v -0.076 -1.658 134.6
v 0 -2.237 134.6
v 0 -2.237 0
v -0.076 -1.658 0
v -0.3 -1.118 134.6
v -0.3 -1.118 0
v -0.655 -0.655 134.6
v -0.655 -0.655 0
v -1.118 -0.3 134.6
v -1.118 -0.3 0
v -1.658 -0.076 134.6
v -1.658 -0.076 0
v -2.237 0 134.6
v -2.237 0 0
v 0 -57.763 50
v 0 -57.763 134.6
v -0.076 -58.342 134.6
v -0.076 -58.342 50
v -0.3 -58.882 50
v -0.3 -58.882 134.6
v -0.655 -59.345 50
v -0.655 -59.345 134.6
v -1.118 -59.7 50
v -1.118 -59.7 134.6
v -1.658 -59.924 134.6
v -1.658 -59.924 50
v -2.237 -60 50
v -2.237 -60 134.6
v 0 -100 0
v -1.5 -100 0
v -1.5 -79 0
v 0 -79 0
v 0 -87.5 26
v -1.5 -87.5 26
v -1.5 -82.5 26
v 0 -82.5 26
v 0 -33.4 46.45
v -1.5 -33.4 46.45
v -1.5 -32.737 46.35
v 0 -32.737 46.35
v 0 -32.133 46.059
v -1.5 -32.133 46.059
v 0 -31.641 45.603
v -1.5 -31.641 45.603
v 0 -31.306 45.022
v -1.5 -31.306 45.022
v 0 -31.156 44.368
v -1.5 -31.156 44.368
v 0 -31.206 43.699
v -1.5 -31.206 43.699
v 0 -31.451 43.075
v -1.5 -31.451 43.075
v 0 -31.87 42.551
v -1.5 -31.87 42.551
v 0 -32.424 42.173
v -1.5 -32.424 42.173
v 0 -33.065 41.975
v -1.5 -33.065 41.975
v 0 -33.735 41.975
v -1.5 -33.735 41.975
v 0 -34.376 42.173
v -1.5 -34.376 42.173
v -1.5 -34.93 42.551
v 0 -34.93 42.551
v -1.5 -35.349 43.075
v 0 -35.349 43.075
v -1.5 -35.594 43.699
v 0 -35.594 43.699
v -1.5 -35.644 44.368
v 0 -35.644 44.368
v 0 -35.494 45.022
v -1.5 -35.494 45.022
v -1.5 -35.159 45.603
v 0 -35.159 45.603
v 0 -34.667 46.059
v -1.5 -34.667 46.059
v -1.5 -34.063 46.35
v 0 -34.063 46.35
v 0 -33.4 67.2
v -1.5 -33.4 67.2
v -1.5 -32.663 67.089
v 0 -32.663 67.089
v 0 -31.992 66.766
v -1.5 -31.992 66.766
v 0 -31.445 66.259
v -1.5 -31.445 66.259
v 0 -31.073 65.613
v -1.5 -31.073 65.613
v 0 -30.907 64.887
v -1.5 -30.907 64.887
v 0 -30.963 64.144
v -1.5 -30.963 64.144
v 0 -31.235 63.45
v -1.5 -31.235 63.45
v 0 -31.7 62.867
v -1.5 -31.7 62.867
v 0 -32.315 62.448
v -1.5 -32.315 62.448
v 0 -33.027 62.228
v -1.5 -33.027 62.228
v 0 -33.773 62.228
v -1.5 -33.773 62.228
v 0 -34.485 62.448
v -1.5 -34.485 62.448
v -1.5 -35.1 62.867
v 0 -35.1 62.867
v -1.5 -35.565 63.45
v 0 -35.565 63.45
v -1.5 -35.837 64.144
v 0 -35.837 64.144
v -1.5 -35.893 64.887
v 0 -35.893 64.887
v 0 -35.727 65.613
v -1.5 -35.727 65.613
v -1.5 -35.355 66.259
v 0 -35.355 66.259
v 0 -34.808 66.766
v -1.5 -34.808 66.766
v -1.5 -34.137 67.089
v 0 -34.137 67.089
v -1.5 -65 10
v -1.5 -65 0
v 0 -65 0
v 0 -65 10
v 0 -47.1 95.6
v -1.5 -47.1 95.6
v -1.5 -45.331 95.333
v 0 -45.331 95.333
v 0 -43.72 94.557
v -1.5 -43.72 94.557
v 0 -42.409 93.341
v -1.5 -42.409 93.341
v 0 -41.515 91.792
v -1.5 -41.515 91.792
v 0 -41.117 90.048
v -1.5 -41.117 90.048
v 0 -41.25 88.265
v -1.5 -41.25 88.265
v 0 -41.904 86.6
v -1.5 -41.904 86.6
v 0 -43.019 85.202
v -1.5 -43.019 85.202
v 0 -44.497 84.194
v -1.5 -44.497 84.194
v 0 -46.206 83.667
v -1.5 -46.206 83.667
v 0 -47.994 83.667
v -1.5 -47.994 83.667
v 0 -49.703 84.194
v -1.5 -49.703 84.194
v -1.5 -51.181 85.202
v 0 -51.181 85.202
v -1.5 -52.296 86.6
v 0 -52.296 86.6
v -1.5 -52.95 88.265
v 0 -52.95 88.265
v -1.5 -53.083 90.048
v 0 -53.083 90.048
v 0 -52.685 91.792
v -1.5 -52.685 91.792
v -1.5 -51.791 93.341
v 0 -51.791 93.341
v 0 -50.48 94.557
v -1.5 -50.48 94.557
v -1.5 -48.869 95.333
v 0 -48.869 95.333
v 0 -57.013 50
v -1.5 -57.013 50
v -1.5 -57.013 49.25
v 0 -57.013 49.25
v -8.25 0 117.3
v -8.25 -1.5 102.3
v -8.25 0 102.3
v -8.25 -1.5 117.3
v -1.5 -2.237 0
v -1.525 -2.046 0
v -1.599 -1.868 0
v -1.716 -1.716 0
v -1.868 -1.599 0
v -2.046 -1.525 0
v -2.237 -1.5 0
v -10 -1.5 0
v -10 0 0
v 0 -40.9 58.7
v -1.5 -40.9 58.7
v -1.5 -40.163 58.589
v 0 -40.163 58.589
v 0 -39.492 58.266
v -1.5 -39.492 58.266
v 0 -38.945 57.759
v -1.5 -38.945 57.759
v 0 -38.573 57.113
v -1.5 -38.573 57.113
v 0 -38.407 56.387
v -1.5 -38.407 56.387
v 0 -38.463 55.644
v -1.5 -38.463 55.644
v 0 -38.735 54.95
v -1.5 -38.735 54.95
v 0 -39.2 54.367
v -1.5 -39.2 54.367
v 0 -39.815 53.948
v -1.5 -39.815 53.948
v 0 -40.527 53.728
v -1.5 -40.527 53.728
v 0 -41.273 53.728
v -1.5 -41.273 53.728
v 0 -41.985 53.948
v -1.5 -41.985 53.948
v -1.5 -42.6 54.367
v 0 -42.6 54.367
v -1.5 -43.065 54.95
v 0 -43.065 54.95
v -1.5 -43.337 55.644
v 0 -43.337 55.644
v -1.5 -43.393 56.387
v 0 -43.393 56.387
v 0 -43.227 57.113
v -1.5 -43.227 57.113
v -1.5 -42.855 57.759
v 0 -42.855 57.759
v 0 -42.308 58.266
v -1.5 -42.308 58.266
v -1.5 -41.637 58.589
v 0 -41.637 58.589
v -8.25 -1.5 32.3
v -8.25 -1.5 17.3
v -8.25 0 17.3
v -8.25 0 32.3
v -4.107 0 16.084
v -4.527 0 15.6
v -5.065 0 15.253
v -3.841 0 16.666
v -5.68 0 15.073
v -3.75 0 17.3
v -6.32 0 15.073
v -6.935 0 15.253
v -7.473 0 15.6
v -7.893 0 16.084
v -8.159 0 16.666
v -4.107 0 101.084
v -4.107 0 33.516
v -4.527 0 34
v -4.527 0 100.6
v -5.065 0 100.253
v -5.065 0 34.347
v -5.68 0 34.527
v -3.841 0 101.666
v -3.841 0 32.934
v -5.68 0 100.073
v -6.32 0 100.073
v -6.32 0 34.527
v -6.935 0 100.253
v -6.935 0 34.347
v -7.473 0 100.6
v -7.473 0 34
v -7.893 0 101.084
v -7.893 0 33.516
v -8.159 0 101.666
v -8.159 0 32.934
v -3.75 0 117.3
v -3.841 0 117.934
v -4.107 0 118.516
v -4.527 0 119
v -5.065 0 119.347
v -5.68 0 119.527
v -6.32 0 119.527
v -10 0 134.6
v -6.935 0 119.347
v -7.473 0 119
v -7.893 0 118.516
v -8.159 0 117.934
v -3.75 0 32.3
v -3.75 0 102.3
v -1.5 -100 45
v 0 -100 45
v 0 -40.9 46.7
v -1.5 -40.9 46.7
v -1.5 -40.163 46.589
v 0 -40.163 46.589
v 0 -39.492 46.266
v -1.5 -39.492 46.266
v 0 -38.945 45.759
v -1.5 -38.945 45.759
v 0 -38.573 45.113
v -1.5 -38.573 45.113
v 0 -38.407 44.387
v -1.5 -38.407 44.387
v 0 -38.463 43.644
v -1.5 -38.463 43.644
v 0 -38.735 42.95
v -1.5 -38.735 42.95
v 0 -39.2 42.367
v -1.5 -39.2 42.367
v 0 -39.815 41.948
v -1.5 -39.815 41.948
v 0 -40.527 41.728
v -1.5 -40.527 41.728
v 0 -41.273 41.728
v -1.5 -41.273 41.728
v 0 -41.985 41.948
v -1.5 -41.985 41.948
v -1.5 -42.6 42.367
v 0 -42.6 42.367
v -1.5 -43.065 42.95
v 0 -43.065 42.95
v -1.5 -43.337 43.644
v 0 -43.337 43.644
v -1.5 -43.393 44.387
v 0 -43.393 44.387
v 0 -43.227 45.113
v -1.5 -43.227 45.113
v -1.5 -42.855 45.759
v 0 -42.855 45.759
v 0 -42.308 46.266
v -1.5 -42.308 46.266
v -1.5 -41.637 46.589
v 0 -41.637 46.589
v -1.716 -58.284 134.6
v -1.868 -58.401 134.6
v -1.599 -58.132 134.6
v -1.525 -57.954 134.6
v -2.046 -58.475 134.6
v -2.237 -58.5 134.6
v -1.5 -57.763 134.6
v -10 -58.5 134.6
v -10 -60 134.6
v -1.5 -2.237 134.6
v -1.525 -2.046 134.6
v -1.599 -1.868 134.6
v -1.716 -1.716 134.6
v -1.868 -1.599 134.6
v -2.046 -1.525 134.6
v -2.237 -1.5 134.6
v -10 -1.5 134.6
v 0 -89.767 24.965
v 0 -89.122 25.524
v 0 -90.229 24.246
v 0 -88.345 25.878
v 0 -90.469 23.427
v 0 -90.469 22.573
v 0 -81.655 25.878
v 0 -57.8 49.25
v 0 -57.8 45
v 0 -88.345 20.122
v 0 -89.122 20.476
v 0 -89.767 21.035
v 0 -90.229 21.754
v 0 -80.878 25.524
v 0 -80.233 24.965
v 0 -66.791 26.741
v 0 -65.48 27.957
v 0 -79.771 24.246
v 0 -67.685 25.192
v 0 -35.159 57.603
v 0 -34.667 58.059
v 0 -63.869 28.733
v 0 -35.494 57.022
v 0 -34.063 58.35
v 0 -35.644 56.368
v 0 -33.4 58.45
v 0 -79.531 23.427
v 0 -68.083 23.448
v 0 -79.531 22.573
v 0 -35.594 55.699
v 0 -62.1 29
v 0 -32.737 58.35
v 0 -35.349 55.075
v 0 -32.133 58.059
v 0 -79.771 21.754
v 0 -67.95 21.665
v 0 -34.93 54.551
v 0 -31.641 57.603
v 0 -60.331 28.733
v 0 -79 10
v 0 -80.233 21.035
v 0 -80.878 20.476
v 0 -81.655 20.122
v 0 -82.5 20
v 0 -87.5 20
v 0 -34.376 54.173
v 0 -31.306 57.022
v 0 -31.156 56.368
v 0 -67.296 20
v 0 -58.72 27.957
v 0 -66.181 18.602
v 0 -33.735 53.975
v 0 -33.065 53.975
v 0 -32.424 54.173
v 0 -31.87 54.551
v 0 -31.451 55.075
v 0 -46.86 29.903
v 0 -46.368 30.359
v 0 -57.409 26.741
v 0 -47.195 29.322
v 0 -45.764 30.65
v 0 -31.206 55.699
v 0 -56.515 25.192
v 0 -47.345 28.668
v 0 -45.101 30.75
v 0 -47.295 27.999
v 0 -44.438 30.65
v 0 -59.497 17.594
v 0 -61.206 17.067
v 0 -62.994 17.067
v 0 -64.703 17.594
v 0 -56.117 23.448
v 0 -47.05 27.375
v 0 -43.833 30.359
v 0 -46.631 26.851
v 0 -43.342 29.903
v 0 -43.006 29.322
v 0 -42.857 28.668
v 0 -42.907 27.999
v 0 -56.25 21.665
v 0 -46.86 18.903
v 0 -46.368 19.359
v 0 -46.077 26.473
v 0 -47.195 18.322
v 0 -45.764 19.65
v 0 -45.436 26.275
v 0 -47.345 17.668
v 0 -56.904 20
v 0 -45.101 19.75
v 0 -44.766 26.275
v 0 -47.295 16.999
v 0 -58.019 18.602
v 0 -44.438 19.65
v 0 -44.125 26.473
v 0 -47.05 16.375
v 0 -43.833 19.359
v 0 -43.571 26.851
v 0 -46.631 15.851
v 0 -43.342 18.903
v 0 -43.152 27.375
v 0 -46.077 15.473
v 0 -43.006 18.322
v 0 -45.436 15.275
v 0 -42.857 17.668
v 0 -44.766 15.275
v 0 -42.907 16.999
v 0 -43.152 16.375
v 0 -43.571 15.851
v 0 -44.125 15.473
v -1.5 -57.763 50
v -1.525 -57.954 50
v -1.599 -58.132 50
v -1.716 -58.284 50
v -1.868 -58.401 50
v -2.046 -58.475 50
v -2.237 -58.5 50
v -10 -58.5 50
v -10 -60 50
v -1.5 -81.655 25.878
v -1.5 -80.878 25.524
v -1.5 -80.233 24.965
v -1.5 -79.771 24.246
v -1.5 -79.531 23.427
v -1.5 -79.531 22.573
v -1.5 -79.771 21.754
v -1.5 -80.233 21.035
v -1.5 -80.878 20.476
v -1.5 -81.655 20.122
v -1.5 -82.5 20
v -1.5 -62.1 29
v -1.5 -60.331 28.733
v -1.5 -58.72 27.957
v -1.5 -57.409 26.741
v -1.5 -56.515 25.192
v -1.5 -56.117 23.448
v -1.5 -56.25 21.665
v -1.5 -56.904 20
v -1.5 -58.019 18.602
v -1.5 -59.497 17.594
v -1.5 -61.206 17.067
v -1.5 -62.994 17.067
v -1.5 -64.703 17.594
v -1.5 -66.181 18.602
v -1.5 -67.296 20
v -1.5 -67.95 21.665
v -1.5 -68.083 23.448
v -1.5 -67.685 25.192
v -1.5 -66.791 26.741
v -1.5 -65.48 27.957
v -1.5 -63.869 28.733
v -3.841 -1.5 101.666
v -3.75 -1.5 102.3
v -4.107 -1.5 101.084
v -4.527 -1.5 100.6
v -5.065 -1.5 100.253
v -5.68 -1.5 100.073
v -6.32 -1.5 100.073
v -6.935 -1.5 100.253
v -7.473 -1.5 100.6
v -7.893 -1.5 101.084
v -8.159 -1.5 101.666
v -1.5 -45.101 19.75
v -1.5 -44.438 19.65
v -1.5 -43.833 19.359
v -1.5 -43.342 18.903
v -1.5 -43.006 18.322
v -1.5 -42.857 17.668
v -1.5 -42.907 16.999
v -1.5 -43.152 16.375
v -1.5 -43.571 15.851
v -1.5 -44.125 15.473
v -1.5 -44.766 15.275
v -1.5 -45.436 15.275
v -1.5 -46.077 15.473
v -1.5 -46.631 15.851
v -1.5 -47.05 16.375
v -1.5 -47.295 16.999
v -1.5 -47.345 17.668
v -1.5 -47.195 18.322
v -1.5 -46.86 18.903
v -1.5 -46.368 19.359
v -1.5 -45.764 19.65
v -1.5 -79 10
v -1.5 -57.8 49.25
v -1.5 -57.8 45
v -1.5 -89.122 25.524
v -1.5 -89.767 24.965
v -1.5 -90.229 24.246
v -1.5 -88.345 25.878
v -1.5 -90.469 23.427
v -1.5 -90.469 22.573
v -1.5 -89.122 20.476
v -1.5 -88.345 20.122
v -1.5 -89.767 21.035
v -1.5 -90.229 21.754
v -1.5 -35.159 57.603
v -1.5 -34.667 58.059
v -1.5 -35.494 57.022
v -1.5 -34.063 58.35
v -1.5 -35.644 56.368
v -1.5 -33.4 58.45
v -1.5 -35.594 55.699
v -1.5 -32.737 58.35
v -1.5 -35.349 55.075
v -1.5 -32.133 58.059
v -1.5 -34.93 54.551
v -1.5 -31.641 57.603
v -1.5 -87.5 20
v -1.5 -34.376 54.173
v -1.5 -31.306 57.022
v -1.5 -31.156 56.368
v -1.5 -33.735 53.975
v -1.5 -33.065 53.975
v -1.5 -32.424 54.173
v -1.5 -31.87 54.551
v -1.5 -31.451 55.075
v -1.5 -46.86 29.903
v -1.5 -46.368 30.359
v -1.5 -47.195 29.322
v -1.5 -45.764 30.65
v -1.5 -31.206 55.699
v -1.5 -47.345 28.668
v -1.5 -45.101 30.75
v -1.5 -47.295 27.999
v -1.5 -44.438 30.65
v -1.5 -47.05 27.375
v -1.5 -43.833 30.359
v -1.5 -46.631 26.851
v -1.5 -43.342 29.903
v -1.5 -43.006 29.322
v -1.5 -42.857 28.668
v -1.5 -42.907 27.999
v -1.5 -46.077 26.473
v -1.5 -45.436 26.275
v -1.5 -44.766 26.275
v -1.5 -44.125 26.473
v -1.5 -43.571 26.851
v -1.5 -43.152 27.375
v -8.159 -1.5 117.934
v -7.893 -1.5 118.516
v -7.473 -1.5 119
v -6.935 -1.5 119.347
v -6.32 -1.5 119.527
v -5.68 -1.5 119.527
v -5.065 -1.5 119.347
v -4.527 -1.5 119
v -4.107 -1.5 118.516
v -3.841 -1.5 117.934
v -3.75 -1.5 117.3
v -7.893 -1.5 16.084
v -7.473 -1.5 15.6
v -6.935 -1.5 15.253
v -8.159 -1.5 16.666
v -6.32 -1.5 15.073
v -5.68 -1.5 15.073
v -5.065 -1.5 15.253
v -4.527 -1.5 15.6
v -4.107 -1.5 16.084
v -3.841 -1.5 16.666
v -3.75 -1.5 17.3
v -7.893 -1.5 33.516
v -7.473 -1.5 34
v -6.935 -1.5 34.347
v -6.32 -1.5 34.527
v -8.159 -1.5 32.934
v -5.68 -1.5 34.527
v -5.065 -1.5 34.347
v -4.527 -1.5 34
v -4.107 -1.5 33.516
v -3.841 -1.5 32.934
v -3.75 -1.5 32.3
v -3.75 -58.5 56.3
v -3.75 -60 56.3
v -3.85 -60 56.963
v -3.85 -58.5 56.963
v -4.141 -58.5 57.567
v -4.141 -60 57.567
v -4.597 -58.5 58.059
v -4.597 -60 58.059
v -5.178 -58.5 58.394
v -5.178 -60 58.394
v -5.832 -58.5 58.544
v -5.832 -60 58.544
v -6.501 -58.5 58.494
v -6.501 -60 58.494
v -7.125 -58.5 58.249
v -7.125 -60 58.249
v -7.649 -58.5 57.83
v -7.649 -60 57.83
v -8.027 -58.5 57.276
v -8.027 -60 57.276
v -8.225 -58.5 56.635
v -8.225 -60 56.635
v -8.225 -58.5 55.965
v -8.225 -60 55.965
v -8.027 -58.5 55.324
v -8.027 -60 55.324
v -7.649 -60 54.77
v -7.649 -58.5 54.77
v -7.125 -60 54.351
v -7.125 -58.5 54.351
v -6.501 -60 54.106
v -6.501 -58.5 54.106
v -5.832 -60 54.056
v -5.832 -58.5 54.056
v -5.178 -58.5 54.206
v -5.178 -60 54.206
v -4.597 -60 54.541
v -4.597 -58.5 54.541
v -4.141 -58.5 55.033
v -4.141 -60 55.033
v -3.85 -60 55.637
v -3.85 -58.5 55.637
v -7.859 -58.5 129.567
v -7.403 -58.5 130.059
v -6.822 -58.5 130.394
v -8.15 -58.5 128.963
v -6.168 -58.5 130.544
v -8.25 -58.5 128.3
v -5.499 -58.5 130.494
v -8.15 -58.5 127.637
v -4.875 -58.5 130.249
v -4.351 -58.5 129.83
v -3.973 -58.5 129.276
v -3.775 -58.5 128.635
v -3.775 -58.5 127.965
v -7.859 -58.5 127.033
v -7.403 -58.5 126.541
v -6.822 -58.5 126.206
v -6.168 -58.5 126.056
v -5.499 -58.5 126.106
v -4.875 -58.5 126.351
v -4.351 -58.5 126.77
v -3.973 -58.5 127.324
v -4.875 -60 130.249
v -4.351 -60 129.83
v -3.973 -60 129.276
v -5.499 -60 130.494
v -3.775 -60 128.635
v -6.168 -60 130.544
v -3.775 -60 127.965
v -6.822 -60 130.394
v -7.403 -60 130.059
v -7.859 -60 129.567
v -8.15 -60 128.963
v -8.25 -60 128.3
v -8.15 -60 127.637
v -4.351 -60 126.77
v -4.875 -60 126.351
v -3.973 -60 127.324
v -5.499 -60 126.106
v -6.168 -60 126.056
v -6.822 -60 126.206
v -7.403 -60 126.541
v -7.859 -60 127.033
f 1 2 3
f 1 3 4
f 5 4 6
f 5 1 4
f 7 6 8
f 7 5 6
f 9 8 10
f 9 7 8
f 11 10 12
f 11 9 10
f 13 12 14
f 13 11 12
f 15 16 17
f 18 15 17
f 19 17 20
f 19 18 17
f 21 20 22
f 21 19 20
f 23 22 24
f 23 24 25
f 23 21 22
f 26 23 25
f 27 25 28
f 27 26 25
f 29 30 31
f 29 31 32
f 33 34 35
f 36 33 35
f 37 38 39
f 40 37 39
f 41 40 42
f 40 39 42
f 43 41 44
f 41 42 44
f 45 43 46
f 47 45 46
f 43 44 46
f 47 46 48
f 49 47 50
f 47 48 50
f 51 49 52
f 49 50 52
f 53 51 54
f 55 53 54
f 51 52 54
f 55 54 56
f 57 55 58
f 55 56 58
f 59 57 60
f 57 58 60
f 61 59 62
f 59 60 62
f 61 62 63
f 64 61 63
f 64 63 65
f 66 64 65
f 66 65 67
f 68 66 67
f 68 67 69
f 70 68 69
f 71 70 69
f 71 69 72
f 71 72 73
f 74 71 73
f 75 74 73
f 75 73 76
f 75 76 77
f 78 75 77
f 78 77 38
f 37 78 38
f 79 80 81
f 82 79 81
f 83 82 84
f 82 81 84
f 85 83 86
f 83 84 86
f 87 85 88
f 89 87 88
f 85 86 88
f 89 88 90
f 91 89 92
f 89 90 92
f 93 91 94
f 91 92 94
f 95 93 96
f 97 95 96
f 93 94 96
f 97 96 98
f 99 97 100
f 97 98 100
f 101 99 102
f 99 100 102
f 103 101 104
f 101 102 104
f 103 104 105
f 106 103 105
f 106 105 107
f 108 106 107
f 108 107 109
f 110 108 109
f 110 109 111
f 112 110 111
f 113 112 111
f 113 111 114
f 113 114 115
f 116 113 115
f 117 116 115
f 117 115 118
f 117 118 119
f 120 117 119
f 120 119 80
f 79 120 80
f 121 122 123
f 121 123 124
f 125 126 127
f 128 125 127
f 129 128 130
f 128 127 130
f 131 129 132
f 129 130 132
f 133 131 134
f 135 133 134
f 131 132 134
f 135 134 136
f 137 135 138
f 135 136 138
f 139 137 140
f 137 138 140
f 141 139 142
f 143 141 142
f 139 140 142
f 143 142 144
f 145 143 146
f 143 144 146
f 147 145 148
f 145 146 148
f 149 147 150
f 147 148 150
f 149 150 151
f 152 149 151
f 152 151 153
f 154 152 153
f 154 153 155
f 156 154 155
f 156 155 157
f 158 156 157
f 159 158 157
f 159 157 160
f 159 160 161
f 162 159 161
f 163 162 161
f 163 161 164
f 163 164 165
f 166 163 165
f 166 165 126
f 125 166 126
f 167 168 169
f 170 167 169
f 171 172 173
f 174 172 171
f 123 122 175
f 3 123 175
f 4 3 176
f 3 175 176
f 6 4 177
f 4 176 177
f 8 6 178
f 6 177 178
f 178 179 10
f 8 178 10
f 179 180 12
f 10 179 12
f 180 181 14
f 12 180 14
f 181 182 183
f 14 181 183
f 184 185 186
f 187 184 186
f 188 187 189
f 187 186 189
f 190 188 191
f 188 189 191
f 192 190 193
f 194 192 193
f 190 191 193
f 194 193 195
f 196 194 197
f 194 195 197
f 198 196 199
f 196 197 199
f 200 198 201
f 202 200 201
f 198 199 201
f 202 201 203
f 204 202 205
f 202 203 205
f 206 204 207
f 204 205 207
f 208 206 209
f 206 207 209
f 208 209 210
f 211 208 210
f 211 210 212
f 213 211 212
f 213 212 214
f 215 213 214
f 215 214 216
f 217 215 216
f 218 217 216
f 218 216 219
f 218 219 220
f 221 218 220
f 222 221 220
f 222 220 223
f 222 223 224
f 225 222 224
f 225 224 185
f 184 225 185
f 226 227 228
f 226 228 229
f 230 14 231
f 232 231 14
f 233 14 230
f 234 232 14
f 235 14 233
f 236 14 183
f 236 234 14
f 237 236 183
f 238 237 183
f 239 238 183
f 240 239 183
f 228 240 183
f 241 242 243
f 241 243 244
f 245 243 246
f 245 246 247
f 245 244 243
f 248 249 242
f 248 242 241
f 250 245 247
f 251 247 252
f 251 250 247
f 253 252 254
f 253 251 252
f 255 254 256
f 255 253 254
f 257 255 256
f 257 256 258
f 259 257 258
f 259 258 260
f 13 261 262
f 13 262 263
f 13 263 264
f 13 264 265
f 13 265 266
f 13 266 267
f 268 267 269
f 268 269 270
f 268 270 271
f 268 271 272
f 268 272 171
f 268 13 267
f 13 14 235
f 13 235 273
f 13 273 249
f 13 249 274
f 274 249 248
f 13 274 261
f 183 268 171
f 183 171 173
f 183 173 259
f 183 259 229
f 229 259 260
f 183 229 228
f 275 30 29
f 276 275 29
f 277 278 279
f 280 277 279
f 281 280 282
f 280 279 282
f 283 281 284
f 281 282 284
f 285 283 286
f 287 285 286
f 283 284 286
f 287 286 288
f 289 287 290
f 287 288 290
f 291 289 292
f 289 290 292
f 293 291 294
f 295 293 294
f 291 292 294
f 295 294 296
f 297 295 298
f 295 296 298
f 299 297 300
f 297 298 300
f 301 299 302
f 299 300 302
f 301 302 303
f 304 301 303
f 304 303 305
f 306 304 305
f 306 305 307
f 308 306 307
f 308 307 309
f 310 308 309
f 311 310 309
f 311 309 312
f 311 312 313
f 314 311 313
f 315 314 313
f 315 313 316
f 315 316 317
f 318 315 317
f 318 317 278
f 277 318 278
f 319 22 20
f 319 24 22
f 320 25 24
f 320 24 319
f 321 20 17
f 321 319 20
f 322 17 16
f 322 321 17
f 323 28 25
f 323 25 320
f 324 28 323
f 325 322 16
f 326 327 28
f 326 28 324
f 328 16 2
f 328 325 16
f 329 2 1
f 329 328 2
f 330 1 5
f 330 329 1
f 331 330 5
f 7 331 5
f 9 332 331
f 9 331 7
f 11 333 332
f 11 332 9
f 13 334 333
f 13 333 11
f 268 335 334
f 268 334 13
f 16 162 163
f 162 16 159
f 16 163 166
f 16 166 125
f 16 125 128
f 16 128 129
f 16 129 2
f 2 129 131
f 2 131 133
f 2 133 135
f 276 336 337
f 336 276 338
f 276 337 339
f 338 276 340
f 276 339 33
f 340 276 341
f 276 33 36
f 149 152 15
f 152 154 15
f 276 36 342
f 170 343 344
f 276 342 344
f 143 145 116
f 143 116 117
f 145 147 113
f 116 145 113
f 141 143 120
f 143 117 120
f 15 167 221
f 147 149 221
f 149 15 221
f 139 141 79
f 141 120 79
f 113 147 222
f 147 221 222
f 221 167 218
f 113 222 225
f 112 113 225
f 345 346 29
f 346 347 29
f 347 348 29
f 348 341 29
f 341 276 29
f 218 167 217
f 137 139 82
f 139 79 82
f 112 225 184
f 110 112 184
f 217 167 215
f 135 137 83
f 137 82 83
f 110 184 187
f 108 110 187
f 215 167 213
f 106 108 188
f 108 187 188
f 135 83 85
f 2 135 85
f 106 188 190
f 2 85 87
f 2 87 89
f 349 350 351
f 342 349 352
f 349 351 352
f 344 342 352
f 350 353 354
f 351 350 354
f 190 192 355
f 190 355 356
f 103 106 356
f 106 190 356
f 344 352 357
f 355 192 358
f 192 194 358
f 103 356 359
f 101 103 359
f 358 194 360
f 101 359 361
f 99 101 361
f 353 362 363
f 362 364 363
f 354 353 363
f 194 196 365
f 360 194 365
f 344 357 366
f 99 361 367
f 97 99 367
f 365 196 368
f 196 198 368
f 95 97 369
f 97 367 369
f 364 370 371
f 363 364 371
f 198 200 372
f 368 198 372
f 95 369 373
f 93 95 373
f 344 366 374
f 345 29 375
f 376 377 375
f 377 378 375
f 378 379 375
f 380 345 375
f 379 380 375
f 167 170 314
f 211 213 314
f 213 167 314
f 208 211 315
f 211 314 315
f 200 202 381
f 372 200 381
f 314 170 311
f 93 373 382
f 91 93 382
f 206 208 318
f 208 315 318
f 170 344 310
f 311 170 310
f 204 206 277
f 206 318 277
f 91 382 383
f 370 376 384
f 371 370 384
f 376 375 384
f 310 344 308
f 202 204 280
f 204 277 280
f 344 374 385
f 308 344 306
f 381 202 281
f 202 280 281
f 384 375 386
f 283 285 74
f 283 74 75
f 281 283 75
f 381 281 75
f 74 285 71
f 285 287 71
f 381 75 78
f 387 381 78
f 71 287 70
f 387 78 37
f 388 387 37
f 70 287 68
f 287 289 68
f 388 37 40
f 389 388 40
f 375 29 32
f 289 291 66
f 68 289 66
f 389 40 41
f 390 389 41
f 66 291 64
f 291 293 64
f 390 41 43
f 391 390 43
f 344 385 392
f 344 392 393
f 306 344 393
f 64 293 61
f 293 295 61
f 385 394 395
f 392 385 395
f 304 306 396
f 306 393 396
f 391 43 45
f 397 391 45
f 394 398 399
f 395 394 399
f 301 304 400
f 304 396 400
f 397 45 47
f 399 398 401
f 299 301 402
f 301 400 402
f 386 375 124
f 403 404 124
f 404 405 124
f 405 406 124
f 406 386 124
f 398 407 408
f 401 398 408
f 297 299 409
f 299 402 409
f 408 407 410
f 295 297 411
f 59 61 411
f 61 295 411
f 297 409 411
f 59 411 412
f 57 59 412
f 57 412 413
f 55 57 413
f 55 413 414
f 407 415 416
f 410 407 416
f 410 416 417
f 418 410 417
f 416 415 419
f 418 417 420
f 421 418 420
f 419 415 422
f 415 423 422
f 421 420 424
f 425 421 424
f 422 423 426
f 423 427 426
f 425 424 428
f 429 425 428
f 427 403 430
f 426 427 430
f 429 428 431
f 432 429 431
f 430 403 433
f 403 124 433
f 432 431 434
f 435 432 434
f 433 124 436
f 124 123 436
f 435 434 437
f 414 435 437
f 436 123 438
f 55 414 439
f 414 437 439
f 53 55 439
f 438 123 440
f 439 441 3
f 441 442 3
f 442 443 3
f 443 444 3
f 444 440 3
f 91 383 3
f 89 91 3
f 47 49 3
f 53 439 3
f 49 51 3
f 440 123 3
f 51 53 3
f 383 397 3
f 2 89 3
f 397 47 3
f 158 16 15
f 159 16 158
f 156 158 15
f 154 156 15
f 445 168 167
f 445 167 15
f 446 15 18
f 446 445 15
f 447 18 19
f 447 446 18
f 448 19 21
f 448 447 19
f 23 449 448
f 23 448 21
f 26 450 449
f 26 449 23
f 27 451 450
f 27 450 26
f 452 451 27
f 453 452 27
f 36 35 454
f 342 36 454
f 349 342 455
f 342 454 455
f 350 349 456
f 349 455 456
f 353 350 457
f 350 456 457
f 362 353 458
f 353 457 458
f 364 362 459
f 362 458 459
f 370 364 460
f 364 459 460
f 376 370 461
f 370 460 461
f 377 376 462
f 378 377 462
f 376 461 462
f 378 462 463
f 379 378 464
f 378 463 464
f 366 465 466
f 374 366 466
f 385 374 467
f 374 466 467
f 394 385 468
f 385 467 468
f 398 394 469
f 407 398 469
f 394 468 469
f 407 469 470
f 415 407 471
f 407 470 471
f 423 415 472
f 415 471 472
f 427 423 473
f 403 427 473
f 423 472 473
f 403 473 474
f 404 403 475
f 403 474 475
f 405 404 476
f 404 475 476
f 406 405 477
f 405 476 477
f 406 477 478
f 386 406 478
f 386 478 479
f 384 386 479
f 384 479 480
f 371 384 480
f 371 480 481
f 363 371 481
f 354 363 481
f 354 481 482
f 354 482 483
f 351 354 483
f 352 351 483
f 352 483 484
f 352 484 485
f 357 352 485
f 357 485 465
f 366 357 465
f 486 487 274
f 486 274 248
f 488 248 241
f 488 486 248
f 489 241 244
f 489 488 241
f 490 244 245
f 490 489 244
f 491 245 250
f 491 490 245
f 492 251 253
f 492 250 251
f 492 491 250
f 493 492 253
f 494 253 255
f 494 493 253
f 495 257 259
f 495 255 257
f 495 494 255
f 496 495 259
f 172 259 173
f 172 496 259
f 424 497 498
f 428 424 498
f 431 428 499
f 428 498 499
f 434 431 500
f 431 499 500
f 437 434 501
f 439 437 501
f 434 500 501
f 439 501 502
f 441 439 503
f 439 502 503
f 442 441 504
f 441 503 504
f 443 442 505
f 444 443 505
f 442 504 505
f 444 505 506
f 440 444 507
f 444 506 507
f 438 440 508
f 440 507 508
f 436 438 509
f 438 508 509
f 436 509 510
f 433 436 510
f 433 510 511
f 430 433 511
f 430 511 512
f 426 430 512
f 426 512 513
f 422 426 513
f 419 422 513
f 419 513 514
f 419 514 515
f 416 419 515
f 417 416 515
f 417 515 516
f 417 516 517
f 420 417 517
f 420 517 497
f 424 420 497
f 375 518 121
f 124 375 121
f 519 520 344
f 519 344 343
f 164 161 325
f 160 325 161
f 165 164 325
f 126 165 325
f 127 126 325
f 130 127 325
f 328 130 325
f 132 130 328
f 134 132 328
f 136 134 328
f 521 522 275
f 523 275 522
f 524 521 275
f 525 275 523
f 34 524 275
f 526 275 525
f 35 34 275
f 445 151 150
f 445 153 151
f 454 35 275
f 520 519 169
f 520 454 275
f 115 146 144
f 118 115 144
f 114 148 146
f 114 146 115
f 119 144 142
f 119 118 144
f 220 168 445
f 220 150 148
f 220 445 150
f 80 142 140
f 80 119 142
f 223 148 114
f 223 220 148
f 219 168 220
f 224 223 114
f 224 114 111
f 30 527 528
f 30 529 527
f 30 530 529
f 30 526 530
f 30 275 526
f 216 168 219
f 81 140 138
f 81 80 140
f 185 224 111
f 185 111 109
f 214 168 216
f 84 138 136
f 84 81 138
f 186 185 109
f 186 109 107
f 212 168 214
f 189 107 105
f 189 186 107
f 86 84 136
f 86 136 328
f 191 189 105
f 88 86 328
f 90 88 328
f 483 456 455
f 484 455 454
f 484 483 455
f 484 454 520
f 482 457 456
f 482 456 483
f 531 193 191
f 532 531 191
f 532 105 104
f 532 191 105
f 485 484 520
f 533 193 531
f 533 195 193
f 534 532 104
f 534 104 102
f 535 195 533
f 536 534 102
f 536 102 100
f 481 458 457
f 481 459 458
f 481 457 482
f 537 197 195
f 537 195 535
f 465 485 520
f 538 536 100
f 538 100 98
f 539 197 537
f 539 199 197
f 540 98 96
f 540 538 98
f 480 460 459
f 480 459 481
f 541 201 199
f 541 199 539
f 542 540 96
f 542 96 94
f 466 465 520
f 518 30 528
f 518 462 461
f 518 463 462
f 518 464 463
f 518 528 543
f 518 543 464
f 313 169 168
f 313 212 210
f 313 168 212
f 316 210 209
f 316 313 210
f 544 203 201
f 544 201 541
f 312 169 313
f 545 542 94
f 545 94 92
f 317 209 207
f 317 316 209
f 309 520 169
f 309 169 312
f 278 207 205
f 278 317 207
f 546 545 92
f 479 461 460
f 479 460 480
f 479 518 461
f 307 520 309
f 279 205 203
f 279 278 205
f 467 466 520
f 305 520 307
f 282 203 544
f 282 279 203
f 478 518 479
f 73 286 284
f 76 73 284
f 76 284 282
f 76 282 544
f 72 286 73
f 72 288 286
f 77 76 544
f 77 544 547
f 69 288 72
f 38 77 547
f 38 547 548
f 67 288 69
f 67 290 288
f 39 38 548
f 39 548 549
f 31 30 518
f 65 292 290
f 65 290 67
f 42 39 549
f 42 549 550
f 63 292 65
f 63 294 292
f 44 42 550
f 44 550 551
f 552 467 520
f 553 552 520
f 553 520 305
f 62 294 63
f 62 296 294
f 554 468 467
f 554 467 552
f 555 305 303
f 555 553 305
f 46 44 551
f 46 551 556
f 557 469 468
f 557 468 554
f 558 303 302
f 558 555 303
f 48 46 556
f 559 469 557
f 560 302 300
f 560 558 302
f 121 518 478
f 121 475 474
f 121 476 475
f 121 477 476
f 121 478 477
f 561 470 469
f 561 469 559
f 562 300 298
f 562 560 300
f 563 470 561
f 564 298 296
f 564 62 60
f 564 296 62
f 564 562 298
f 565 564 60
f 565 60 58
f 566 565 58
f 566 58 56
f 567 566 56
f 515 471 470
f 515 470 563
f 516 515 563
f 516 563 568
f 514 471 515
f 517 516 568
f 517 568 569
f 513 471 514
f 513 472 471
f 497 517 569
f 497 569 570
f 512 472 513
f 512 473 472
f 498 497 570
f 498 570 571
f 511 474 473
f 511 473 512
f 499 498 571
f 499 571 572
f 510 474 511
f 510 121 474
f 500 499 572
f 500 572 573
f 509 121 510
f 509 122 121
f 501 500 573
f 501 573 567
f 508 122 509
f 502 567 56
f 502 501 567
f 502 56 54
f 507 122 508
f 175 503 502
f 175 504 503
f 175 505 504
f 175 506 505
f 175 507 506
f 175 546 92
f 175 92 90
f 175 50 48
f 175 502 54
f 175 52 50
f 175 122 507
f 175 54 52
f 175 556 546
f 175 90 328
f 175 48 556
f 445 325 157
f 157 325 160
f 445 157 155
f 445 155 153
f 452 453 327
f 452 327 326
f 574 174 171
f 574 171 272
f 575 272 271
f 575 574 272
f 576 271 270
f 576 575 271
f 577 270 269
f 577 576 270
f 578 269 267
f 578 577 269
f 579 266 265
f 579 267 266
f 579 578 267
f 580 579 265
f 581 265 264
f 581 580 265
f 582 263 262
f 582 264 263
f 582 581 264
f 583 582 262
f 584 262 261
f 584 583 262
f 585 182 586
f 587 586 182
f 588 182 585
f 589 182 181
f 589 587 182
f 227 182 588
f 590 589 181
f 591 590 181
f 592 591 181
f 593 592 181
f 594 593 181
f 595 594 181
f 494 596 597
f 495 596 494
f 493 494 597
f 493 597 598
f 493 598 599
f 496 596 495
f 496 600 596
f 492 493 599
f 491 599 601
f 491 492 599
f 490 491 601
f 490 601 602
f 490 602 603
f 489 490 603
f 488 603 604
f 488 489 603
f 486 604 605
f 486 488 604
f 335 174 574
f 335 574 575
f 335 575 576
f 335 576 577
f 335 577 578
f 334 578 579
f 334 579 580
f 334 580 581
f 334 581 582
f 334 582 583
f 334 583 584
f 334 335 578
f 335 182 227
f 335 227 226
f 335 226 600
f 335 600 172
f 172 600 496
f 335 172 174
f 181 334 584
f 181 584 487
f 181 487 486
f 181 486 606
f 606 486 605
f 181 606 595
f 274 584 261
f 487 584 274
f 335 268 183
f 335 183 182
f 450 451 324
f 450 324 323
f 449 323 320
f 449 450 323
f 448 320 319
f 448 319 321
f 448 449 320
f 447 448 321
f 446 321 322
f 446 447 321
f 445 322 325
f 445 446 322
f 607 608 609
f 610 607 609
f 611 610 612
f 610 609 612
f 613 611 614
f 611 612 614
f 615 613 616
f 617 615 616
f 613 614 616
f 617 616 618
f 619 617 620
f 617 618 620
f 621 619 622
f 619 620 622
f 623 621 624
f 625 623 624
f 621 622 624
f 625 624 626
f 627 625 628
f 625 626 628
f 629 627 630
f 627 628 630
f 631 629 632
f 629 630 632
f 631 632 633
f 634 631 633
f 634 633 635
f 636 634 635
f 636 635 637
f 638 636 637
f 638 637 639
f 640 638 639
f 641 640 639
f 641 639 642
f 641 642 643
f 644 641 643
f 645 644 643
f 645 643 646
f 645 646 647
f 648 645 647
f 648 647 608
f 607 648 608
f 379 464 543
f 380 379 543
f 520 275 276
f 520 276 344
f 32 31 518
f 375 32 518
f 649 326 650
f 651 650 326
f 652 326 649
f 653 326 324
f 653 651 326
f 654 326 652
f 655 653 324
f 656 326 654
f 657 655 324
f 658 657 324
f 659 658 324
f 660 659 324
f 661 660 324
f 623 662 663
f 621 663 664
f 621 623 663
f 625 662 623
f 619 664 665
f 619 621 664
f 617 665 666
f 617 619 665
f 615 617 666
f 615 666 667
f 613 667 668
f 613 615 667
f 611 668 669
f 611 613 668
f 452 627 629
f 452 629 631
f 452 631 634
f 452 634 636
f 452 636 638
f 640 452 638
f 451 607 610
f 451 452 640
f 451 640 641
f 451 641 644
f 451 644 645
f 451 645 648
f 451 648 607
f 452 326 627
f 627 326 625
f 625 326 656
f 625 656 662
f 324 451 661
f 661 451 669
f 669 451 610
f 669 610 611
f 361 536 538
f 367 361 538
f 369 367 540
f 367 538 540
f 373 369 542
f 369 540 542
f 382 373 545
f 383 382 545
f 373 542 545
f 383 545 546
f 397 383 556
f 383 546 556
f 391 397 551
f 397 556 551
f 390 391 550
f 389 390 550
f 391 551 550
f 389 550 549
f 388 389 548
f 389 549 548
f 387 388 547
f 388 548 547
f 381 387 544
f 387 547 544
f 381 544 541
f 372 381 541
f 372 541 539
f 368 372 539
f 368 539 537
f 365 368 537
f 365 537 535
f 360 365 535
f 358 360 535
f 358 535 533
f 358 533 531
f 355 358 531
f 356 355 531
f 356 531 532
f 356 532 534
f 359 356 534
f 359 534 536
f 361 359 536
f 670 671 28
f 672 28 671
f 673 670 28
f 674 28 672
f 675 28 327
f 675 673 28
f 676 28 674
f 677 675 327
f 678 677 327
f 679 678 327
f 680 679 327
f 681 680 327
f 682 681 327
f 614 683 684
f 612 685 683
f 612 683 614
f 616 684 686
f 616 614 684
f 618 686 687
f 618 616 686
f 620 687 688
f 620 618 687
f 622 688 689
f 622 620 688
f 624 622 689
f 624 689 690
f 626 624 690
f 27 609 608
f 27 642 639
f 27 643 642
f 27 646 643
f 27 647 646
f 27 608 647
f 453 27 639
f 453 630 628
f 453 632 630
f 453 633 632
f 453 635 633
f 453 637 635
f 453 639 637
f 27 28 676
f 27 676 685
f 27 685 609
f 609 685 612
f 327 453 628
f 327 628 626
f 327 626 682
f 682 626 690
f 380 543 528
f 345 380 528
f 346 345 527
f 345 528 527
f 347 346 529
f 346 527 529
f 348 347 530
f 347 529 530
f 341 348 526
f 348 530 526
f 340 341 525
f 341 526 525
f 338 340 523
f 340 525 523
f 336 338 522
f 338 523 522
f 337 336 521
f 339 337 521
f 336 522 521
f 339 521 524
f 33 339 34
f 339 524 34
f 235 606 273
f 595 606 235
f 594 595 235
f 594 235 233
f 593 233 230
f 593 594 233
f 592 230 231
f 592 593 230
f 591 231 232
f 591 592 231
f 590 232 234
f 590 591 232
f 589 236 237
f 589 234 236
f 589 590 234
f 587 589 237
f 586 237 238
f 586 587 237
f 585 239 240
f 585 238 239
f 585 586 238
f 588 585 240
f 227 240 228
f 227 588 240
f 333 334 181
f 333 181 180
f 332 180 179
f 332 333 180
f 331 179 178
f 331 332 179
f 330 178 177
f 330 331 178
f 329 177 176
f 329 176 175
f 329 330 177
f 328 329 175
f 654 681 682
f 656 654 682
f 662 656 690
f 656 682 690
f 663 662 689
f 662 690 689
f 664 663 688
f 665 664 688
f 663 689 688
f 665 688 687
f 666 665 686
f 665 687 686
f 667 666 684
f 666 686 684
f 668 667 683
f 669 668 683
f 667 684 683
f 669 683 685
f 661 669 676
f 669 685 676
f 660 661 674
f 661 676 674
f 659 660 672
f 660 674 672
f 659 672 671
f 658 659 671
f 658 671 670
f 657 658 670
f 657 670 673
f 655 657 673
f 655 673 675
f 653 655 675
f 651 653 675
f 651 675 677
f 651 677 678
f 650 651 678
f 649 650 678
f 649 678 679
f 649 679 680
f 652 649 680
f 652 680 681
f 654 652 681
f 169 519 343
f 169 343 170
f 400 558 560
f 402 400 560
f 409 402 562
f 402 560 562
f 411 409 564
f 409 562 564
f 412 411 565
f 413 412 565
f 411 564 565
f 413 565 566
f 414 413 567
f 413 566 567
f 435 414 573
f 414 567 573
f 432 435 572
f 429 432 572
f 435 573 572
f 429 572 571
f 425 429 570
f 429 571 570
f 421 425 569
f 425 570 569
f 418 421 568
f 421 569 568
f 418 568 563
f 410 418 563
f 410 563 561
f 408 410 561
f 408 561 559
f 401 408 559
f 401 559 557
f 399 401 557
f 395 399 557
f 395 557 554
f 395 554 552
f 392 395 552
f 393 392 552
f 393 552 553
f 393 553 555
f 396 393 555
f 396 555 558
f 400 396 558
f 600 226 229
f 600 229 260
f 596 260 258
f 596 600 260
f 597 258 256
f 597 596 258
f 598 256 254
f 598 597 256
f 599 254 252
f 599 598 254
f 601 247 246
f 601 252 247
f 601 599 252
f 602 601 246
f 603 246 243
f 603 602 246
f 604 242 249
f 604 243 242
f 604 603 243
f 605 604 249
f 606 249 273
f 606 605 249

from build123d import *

# Parameters (mm, degrees)
SKETCH_1_W                        = 1.5
SKETCH_1_H                        = 100
SM_BASE_FLANGE_1_DEPTH            = 134.6
SKETCH_6_R                        = 2.25
SKETCH_6_R_2                      = 2.5
SKETCH_6_R_3                      = 6
SKETCH_6_W                        = 89.6
SKETCH_6_H                        = 40
SKETCH_6_W_2                      = 10
SKETCH_6_H_2                      = 14
CUT_EXTRUDE_1_DEPTH               = 10
SKETCH_10_W                       = 5
SKETCH_10_H                       = 2.2
CUT_EXTRUDE_2_DEPTH               = 10
SM_EDGE_FLANGE_2_STRIP_W          = 7.4732
SM_EDGE_FLANGE_2_STRIP_H          = 1.5
SM_EDGE_FLANGE_2_STRIP_CUT_DEPTH  = 84.6
SM_EDGE_FLANGE_2_RELIEF_W         = 8.2232
SM_EDGE_FLANGE_2_RELIEF_H         = 0.75
SM_EDGE_FLANGE_2_RELIEF_CUT_DEPTH = 1.5
SM_EDGE_FLANGE_2_DEPTH            = 84.6
SM_EDGE_FLANGE_3_STRIP_W          = 7.4732
SM_EDGE_FLANGE_3_STRIP_H          = 1.5
SM_EDGE_FLANGE_3_STRIP_CUT_DEPTH  = 134.6
SM_EDGE_FLANGE_3_DEPTH            = 134.6
CUT_EXTRUDE_3_DEPTH               = 10
SKETCH_18_R                       = 2.25
CUT_EXTRUDE_4_DEPTH               = 10


# Sheet-metal steps are written as plain solids
with BuildPart() as part:
    # Sketch 1 → 基体-法兰1 (new body)
    with BuildSketch(Plane.XY):
        with Locations((-0.75, -50)):
            Rectangle(SKETCH_1_W, SKETCH_1_H)
    extrude(amount=SM_BASE_FLANGE_1_DEPTH)

    # 草图6 → 切除-拉伸1 (cut)
    with BuildSketch(Plane.ZY.offset(1.5)):
        with Locations((17.5, -45.10094434)):
            Circle(SKETCH_6_R)
        with Locations((28.5, -45.10094434)):
            Circle(SKETCH_6_R)
        with Locations((44.2, -33.4)):
            Circle(SKETCH_6_R)
        with Locations((56.2, -33.4)):
            Circle(SKETCH_6_R)
        with Locations((44.2, -40.9)):
            Circle(SKETCH_6_R_2)
        with Locations((56.2, -40.9)):
            Circle(SKETCH_6_R_2)
        with Locations((64.7, -33.4)):
            Circle(SKETCH_6_R_2)
        with Locations((89.6, -47.1)):
            Circle(SKETCH_6_R_3)
        with Locations((23, -62.1)):
            Circle(SKETCH_6_R_3)
        with Locations((89.8, -80)):
            Rectangle(SKETCH_6_W, SKETCH_6_H)
        with Locations((5, -72)):
            Rectangle(SKETCH_6_W_2, SKETCH_6_H_2)
        with BuildLine():
            Line((20, -82.5), (20, -87.5))
            ThreePointArc((20, -87.5), (23, -90.5), (26, -87.5))
            Line((26, -87.5), (26, -82.5))
            ThreePointArc((26, -82.5), (23, -79.5), (20, -82.5))
        make_face()
    extrude(amount=-CUT_EXTRUDE_1_DEPTH, mode=Mode.SUBTRACT)

    # 草图10 → 切除-拉伸2 (cut)
    with BuildSketch(Plane.ZY.offset(1.5)):
        with Locations((47.5, -58.9)):
            Rectangle(SKETCH_10_W, SKETCH_10_H)
    extrude(amount=-CUT_EXTRUDE_2_DEPTH, mode=Mode.SUBTRACT)

    # 边线-法兰2 strip (across the edge) → 边线-法兰2 strip cut (cut)
    with BuildSketch(Plane(origin=(-1.5, -60, 50), x_dir=(0, 1, 0), z_dir=(0, 0, 1))):
        with Locations((-1.5, -0.75)):
            Rectangle(SM_EDGE_FLANGE_2_STRIP_W, SM_EDGE_FLANGE_2_STRIP_H)
    extrude(amount=SM_EDGE_FLANGE_2_STRIP_CUT_DEPTH, mode=Mode.SUBTRACT)

    # 边线-法兰2 relief (on the sheet) → 边线-法兰2 relief cut (cut)
    with BuildSketch(Plane(origin=(-1.5, -57.7634, 50), x_dir=(0, 1, 0), z_dir=(-1, 0, 0))):
        with Locations((-3.3616, 0.375)):
            Rectangle(SM_EDGE_FLANGE_2_RELIEF_W, SM_EDGE_FLANGE_2_RELIEF_H)
    extrude(amount=-SM_EDGE_FLANGE_2_RELIEF_CUT_DEPTH, mode=Mode.SUBTRACT)

    # 边线-法兰2 section (across the edge) → 边线-法兰2 (add)
    with BuildSketch(Plane(origin=(-1.5, -60, 50), x_dir=(0, 1, 0), z_dir=(0, 0, 1))):
        with BuildLine():
            Line((0, 0.7366), (0, 8.5))
            Line((0, 8.5), (1.5, 8.5))
            Line((1.5, 8.5), (1.5, 0.7366))
            ThreePointArc((1.5, 0.7366), (1.715745145, 0.215745145), (2.2366, 0))
            Line((2.2366, 0), (2.2366, -1.5))
            ThreePointArc((2.2366, -1.5), (0.655084973, -0.844915027), (0, 0.7366))
        make_face()
    extrude(amount=SM_EDGE_FLANGE_2_DEPTH)

    # 边线-法兰3 strip (across the edge) → 边线-法兰3 strip cut (cut)
    with BuildSketch(Plane(origin=(-1.5, 0, 134.6), x_dir=(0, -1, 0), z_dir=(0, 0, -1))):
        with Locations((-1.5, -0.75)):
            Rectangle(SM_EDGE_FLANGE_3_STRIP_W, SM_EDGE_FLANGE_3_STRIP_H)
    extrude(amount=SM_EDGE_FLANGE_3_STRIP_CUT_DEPTH, mode=Mode.SUBTRACT)

    # 边线-法兰3 section (across the edge) → 边线-法兰3 (add)
    with BuildSketch(Plane(origin=(-1.5, 0, 134.6), x_dir=(0, -1, 0), z_dir=(0, 0, -1))):
        with BuildLine():
            Line((0, 0.7366), (0, 8.5))
            Line((0, 8.5), (1.5, 8.5))
            Line((1.5, 8.5), (1.5, 0.7366))
            ThreePointArc((1.5, 0.7366), (1.715745145, 0.215745145), (2.2366, 0))
            Line((2.2366, 0), (2.2366, -1.5))
            ThreePointArc((2.2366, -1.5), (0.655084973, -0.844915027), (0, 0.7366))
        make_face()
    extrude(amount=SM_EDGE_FLANGE_3_DEPTH)

    # 草图17 → 切除-拉伸3 (cut)
    with BuildSketch(Plane.XZ.offset(1.5)):
        with BuildLine():
            Line((-8.25, 17.3), (-8.25, 32.3))
            ThreePointArc((-8.25, 32.3), (-6, 34.55), (-3.75, 32.3))
            Line((-3.75, 32.3), (-3.75, 17.3))
            ThreePointArc((-3.75, 17.3), (-6, 15.05), (-8.25, 17.3))
        make_face()
        with BuildLine():
            Line((-3.75, 117.3), (-3.75, 102.3))
            ThreePointArc((-3.75, 102.3), (-6, 100.05), (-8.25, 102.3))
            Line((-8.25, 102.3), (-8.25, 117.3))
            ThreePointArc((-8.25, 117.3), (-6, 119.55), (-3.75, 117.3))
        make_face()
    extrude(amount=-CUT_EXTRUDE_3_DEPTH, mode=Mode.SUBTRACT)

    # 草图18 → 切除-拉伸4 (cut)
    with BuildSketch(Plane.XZ.offset(60)):
        with Locations((-6, 56.3)):
            Circle(SKETCH_18_R)
        with Locations(Location((-6, 128.3, 0), (0, 0, 180))):
            Circle(SKETCH_18_R)
    extrude(amount=-CUT_EXTRUDE_4_DEPTH, mode=Mode.SUBTRACT)


solid = part.part
